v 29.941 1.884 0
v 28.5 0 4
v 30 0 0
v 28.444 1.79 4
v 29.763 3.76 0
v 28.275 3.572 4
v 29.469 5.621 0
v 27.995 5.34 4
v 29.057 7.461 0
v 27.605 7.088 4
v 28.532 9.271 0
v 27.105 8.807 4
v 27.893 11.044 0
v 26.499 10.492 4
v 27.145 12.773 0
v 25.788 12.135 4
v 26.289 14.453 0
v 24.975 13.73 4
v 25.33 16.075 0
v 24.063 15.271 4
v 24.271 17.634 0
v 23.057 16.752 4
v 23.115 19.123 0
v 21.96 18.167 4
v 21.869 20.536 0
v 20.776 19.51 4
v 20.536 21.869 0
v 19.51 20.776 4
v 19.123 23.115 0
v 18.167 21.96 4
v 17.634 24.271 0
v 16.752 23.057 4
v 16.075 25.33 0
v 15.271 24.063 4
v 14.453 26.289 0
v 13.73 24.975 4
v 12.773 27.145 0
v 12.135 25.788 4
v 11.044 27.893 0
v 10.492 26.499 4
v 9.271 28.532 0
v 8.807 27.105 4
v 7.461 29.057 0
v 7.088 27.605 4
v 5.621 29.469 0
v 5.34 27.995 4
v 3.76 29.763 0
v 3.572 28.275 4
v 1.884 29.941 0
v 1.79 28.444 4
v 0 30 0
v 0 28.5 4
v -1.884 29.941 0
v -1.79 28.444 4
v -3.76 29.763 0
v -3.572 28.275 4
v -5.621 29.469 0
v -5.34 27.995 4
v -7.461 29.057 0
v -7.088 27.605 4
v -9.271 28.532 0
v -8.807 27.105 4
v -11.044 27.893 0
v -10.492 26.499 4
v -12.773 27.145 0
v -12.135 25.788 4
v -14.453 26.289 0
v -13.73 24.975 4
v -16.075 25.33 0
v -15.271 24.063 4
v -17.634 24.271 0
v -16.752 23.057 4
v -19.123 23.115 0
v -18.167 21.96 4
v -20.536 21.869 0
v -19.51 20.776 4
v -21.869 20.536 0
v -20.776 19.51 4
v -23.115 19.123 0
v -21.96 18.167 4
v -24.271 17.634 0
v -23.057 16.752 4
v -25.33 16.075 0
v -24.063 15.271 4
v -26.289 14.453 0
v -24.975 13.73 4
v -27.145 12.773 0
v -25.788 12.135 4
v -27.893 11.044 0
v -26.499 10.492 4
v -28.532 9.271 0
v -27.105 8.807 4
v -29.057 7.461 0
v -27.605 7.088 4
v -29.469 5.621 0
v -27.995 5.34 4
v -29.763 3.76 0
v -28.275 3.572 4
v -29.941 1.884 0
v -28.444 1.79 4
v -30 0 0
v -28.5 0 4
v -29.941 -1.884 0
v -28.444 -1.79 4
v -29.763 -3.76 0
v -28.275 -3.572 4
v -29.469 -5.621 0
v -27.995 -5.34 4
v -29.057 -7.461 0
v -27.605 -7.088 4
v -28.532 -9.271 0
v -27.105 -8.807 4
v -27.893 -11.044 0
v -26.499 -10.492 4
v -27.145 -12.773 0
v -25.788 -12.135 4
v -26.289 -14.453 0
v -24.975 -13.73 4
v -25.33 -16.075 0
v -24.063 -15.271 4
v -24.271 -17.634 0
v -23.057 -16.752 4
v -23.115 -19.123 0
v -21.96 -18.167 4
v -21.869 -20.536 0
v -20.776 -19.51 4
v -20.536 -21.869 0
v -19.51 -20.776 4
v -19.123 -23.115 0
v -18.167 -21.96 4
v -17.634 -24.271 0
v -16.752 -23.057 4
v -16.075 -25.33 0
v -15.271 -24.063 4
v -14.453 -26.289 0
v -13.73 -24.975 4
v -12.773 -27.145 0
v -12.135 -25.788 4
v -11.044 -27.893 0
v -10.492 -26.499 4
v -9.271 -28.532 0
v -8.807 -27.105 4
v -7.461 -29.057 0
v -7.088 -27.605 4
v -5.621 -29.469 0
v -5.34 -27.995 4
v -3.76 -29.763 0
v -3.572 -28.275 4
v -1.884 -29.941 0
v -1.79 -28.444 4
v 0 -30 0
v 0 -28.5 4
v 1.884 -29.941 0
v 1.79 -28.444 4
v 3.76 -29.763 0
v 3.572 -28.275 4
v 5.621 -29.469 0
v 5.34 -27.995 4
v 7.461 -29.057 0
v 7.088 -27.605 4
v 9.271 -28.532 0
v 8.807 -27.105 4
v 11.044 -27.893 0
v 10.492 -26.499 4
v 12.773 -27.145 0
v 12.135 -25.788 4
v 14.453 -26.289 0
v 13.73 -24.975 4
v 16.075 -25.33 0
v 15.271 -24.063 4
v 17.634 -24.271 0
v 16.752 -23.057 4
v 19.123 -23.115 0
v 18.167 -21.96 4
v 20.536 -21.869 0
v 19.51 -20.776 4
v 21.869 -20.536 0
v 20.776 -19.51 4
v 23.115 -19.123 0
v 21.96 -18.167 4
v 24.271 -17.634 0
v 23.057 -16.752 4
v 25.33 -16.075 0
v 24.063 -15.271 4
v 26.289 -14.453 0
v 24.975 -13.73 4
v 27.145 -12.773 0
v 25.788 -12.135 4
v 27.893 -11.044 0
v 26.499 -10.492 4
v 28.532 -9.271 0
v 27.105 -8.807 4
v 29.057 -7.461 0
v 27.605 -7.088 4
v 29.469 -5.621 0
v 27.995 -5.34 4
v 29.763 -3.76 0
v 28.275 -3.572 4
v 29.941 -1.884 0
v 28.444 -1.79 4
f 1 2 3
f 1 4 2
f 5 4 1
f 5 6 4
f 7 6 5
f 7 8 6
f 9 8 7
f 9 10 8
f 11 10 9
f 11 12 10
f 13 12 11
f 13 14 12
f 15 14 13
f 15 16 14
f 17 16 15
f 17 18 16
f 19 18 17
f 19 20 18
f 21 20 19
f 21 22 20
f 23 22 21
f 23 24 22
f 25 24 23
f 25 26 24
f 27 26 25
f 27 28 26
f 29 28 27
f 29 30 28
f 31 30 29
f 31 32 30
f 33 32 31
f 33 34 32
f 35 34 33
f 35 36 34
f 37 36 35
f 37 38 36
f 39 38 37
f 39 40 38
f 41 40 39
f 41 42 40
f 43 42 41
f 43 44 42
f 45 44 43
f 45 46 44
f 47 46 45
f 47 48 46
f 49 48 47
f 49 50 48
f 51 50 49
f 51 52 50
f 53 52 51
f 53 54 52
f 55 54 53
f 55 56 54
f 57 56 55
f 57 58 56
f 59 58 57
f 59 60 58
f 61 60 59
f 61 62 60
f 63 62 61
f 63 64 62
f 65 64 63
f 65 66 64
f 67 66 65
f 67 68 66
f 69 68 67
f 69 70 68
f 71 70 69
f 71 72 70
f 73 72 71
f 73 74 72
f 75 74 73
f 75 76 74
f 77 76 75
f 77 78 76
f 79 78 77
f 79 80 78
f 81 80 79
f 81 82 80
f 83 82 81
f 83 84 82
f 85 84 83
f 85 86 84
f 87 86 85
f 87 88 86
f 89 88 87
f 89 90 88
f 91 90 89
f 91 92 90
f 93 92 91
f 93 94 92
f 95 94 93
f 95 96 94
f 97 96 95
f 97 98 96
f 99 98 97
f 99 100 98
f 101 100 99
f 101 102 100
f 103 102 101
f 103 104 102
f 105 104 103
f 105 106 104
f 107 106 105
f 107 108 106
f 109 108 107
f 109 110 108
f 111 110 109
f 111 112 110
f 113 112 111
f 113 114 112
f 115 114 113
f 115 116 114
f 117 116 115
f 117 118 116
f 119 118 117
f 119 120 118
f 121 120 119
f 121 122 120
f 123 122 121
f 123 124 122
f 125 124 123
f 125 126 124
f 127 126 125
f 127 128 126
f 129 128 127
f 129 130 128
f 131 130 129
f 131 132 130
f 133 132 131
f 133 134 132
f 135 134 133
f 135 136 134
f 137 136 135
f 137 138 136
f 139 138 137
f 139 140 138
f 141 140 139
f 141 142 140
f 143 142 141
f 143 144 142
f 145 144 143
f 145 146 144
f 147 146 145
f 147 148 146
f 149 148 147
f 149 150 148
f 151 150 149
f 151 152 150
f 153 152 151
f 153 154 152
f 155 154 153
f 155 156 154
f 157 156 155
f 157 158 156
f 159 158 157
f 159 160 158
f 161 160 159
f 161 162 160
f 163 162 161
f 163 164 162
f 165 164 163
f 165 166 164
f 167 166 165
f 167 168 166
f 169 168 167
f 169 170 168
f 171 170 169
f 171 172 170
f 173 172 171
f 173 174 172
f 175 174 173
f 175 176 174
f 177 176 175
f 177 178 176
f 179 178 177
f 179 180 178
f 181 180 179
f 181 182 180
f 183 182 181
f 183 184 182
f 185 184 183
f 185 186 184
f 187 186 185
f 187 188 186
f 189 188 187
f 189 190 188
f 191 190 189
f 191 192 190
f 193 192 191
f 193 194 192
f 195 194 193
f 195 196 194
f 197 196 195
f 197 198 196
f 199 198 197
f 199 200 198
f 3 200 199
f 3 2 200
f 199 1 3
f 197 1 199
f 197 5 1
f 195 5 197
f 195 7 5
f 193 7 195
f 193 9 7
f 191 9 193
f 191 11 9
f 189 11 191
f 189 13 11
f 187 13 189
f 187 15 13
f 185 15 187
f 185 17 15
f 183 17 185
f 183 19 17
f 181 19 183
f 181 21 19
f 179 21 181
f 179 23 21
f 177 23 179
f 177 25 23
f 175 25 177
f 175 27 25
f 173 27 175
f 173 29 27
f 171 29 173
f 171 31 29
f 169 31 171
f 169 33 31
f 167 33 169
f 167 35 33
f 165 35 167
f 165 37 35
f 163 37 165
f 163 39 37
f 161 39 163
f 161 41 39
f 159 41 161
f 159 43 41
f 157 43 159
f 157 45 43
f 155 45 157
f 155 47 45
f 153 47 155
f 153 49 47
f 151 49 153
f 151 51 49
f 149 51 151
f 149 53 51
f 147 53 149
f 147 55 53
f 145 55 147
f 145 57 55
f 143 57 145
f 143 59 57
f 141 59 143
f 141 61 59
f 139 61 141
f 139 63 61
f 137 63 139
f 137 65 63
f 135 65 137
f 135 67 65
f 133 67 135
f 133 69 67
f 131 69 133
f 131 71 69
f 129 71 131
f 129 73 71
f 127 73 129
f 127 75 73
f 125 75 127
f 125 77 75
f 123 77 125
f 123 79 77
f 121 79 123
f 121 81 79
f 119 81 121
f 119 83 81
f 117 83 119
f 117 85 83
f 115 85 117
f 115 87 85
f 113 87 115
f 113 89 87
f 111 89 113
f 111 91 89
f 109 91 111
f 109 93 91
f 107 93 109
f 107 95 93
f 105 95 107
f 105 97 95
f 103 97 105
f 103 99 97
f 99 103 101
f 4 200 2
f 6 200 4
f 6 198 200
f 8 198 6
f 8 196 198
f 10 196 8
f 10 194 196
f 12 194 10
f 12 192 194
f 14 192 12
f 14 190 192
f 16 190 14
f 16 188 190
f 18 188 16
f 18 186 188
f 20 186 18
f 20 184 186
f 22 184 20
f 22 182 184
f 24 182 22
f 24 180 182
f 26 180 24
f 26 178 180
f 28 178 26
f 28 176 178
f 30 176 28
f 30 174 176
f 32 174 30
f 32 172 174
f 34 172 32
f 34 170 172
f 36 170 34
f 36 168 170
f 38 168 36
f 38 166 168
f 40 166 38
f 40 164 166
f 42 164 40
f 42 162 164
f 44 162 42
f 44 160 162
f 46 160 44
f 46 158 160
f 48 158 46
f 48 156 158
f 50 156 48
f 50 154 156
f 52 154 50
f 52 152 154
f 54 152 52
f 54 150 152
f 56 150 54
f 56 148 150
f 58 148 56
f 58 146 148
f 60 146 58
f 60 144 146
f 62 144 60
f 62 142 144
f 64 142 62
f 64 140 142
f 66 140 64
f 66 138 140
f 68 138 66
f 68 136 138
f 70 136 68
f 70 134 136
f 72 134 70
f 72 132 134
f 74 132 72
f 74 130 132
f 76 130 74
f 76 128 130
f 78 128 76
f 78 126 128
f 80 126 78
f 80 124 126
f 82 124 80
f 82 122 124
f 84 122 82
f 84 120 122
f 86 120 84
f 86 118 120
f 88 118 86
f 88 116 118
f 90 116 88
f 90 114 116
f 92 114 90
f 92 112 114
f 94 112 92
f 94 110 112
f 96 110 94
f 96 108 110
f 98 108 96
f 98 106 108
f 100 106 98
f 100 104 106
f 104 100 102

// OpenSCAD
// file: ../build.scad
$build_id = "";

function building(filename) = is_undef(filename) ?
  !is_undef(build)
  : !is_undef(build) && build == filename;

function previewing() = !building();

module build(filename) {
  $build_id = filename;

  if(!is_undef(scad_build_scan) && scad_build_scan == true) {
    echo(str("scad_build_scan: ", filename));
  }
  else if(previewing() || build == filename) {
    children();
  }
}

module preview_row(spacing) {
  if(previewing()) {
    for(x = [0:1:$children - 1]) {
      translate([x * spacing, 0, 0]) {
        children(x);
      }
    }
  }
  else {
    children();
  }
}

module preview_column(spacing) {
  if(previewing()) {
    for(y = [0:1:$children - 1]) {
      translate([0, y * spacing, 0]) {
        children(y);
      }
    }
  }
  else {
    children();
  }
}
// file: ../minibase.scad
// Based off of titancraft's Customizable Miniature Base (CC0 1.0)
// https://www.thingiverse.com/thing:1112237

include <./build.scad>

$base_rim = 1; //	[1: tapered, 2: inclined, 3: flat]
// Number of sides:
$base_shape = 100; //	[30:Low-res Circle, 100: Hi-res Circle, 5:Pentagon, 6:Hexagon, 8:Octagon, 4:Square, 3:Triangle]

$base_diameter = 32;
$base_height = 4;
$base_slant = 95;

// Percentage:
$base_stretch = 100;

//(tapered base only)
$base_inner_circle_ratio = 40;

module tapered(r=40) {
  $base_rim = 1;
  $base_inner_circle_ratio = r;

  children();
}

module inclined() {
  $base_rim = 2;

  children();
}

module flat() {
  $base_rim = 3;

  children();
}

module shape(s) {
  $base_shape = s;

  children();
}

module diameter(d) {
  $base_diameter = d;

  children();
}

module height(h) {
  $base_height = h;

  children();
}

module slant(s) {
  $base_slant = s;

  children();
}

module stretch(s) {
  $base_stretch = s;

  children();
}

module base(id) {
  build(id) union() {
    radius = $base_diameter/2;
    scale([$base_stretch/100, 1, 1]){
      if ($base_rim == 1){
        // tapered base
        cyl1_height = $base_height * (1-$base_inner_circle_ratio/100);
        cylinder(cyl1_height, radius, radius * $base_slant/100, $fn=$base_shape);

        cyl2_radius = radius  * $base_slant/100 * .95;
        cyl2_height = $base_height - cyl1_height;

        translate([0, 0, cyl1_height]){
          cylinder(cyl2_height, cyl2_radius, cyl2_radius * $base_slant/100, $fn=$base_shape);
          cylinder(cyl2_height*.5, radius * $base_slant/100, cyl2_radius, $fn=$base_shape);
        }
      } else if ($base_rim == 2){
        // inclined base
        cylinder($base_height, radius, radius * $base_slant/100, $fn=$base_shape);
      } else if ($base_rim == 3){
        // flat base

        cylinder($base_height, radius, radius, $fn=$base_shape);
      }
    }
  }
}
// main file
include <../minibase.scad>

inclined() diameter(60) base("60mm-oprgw-monsters-walkers");
